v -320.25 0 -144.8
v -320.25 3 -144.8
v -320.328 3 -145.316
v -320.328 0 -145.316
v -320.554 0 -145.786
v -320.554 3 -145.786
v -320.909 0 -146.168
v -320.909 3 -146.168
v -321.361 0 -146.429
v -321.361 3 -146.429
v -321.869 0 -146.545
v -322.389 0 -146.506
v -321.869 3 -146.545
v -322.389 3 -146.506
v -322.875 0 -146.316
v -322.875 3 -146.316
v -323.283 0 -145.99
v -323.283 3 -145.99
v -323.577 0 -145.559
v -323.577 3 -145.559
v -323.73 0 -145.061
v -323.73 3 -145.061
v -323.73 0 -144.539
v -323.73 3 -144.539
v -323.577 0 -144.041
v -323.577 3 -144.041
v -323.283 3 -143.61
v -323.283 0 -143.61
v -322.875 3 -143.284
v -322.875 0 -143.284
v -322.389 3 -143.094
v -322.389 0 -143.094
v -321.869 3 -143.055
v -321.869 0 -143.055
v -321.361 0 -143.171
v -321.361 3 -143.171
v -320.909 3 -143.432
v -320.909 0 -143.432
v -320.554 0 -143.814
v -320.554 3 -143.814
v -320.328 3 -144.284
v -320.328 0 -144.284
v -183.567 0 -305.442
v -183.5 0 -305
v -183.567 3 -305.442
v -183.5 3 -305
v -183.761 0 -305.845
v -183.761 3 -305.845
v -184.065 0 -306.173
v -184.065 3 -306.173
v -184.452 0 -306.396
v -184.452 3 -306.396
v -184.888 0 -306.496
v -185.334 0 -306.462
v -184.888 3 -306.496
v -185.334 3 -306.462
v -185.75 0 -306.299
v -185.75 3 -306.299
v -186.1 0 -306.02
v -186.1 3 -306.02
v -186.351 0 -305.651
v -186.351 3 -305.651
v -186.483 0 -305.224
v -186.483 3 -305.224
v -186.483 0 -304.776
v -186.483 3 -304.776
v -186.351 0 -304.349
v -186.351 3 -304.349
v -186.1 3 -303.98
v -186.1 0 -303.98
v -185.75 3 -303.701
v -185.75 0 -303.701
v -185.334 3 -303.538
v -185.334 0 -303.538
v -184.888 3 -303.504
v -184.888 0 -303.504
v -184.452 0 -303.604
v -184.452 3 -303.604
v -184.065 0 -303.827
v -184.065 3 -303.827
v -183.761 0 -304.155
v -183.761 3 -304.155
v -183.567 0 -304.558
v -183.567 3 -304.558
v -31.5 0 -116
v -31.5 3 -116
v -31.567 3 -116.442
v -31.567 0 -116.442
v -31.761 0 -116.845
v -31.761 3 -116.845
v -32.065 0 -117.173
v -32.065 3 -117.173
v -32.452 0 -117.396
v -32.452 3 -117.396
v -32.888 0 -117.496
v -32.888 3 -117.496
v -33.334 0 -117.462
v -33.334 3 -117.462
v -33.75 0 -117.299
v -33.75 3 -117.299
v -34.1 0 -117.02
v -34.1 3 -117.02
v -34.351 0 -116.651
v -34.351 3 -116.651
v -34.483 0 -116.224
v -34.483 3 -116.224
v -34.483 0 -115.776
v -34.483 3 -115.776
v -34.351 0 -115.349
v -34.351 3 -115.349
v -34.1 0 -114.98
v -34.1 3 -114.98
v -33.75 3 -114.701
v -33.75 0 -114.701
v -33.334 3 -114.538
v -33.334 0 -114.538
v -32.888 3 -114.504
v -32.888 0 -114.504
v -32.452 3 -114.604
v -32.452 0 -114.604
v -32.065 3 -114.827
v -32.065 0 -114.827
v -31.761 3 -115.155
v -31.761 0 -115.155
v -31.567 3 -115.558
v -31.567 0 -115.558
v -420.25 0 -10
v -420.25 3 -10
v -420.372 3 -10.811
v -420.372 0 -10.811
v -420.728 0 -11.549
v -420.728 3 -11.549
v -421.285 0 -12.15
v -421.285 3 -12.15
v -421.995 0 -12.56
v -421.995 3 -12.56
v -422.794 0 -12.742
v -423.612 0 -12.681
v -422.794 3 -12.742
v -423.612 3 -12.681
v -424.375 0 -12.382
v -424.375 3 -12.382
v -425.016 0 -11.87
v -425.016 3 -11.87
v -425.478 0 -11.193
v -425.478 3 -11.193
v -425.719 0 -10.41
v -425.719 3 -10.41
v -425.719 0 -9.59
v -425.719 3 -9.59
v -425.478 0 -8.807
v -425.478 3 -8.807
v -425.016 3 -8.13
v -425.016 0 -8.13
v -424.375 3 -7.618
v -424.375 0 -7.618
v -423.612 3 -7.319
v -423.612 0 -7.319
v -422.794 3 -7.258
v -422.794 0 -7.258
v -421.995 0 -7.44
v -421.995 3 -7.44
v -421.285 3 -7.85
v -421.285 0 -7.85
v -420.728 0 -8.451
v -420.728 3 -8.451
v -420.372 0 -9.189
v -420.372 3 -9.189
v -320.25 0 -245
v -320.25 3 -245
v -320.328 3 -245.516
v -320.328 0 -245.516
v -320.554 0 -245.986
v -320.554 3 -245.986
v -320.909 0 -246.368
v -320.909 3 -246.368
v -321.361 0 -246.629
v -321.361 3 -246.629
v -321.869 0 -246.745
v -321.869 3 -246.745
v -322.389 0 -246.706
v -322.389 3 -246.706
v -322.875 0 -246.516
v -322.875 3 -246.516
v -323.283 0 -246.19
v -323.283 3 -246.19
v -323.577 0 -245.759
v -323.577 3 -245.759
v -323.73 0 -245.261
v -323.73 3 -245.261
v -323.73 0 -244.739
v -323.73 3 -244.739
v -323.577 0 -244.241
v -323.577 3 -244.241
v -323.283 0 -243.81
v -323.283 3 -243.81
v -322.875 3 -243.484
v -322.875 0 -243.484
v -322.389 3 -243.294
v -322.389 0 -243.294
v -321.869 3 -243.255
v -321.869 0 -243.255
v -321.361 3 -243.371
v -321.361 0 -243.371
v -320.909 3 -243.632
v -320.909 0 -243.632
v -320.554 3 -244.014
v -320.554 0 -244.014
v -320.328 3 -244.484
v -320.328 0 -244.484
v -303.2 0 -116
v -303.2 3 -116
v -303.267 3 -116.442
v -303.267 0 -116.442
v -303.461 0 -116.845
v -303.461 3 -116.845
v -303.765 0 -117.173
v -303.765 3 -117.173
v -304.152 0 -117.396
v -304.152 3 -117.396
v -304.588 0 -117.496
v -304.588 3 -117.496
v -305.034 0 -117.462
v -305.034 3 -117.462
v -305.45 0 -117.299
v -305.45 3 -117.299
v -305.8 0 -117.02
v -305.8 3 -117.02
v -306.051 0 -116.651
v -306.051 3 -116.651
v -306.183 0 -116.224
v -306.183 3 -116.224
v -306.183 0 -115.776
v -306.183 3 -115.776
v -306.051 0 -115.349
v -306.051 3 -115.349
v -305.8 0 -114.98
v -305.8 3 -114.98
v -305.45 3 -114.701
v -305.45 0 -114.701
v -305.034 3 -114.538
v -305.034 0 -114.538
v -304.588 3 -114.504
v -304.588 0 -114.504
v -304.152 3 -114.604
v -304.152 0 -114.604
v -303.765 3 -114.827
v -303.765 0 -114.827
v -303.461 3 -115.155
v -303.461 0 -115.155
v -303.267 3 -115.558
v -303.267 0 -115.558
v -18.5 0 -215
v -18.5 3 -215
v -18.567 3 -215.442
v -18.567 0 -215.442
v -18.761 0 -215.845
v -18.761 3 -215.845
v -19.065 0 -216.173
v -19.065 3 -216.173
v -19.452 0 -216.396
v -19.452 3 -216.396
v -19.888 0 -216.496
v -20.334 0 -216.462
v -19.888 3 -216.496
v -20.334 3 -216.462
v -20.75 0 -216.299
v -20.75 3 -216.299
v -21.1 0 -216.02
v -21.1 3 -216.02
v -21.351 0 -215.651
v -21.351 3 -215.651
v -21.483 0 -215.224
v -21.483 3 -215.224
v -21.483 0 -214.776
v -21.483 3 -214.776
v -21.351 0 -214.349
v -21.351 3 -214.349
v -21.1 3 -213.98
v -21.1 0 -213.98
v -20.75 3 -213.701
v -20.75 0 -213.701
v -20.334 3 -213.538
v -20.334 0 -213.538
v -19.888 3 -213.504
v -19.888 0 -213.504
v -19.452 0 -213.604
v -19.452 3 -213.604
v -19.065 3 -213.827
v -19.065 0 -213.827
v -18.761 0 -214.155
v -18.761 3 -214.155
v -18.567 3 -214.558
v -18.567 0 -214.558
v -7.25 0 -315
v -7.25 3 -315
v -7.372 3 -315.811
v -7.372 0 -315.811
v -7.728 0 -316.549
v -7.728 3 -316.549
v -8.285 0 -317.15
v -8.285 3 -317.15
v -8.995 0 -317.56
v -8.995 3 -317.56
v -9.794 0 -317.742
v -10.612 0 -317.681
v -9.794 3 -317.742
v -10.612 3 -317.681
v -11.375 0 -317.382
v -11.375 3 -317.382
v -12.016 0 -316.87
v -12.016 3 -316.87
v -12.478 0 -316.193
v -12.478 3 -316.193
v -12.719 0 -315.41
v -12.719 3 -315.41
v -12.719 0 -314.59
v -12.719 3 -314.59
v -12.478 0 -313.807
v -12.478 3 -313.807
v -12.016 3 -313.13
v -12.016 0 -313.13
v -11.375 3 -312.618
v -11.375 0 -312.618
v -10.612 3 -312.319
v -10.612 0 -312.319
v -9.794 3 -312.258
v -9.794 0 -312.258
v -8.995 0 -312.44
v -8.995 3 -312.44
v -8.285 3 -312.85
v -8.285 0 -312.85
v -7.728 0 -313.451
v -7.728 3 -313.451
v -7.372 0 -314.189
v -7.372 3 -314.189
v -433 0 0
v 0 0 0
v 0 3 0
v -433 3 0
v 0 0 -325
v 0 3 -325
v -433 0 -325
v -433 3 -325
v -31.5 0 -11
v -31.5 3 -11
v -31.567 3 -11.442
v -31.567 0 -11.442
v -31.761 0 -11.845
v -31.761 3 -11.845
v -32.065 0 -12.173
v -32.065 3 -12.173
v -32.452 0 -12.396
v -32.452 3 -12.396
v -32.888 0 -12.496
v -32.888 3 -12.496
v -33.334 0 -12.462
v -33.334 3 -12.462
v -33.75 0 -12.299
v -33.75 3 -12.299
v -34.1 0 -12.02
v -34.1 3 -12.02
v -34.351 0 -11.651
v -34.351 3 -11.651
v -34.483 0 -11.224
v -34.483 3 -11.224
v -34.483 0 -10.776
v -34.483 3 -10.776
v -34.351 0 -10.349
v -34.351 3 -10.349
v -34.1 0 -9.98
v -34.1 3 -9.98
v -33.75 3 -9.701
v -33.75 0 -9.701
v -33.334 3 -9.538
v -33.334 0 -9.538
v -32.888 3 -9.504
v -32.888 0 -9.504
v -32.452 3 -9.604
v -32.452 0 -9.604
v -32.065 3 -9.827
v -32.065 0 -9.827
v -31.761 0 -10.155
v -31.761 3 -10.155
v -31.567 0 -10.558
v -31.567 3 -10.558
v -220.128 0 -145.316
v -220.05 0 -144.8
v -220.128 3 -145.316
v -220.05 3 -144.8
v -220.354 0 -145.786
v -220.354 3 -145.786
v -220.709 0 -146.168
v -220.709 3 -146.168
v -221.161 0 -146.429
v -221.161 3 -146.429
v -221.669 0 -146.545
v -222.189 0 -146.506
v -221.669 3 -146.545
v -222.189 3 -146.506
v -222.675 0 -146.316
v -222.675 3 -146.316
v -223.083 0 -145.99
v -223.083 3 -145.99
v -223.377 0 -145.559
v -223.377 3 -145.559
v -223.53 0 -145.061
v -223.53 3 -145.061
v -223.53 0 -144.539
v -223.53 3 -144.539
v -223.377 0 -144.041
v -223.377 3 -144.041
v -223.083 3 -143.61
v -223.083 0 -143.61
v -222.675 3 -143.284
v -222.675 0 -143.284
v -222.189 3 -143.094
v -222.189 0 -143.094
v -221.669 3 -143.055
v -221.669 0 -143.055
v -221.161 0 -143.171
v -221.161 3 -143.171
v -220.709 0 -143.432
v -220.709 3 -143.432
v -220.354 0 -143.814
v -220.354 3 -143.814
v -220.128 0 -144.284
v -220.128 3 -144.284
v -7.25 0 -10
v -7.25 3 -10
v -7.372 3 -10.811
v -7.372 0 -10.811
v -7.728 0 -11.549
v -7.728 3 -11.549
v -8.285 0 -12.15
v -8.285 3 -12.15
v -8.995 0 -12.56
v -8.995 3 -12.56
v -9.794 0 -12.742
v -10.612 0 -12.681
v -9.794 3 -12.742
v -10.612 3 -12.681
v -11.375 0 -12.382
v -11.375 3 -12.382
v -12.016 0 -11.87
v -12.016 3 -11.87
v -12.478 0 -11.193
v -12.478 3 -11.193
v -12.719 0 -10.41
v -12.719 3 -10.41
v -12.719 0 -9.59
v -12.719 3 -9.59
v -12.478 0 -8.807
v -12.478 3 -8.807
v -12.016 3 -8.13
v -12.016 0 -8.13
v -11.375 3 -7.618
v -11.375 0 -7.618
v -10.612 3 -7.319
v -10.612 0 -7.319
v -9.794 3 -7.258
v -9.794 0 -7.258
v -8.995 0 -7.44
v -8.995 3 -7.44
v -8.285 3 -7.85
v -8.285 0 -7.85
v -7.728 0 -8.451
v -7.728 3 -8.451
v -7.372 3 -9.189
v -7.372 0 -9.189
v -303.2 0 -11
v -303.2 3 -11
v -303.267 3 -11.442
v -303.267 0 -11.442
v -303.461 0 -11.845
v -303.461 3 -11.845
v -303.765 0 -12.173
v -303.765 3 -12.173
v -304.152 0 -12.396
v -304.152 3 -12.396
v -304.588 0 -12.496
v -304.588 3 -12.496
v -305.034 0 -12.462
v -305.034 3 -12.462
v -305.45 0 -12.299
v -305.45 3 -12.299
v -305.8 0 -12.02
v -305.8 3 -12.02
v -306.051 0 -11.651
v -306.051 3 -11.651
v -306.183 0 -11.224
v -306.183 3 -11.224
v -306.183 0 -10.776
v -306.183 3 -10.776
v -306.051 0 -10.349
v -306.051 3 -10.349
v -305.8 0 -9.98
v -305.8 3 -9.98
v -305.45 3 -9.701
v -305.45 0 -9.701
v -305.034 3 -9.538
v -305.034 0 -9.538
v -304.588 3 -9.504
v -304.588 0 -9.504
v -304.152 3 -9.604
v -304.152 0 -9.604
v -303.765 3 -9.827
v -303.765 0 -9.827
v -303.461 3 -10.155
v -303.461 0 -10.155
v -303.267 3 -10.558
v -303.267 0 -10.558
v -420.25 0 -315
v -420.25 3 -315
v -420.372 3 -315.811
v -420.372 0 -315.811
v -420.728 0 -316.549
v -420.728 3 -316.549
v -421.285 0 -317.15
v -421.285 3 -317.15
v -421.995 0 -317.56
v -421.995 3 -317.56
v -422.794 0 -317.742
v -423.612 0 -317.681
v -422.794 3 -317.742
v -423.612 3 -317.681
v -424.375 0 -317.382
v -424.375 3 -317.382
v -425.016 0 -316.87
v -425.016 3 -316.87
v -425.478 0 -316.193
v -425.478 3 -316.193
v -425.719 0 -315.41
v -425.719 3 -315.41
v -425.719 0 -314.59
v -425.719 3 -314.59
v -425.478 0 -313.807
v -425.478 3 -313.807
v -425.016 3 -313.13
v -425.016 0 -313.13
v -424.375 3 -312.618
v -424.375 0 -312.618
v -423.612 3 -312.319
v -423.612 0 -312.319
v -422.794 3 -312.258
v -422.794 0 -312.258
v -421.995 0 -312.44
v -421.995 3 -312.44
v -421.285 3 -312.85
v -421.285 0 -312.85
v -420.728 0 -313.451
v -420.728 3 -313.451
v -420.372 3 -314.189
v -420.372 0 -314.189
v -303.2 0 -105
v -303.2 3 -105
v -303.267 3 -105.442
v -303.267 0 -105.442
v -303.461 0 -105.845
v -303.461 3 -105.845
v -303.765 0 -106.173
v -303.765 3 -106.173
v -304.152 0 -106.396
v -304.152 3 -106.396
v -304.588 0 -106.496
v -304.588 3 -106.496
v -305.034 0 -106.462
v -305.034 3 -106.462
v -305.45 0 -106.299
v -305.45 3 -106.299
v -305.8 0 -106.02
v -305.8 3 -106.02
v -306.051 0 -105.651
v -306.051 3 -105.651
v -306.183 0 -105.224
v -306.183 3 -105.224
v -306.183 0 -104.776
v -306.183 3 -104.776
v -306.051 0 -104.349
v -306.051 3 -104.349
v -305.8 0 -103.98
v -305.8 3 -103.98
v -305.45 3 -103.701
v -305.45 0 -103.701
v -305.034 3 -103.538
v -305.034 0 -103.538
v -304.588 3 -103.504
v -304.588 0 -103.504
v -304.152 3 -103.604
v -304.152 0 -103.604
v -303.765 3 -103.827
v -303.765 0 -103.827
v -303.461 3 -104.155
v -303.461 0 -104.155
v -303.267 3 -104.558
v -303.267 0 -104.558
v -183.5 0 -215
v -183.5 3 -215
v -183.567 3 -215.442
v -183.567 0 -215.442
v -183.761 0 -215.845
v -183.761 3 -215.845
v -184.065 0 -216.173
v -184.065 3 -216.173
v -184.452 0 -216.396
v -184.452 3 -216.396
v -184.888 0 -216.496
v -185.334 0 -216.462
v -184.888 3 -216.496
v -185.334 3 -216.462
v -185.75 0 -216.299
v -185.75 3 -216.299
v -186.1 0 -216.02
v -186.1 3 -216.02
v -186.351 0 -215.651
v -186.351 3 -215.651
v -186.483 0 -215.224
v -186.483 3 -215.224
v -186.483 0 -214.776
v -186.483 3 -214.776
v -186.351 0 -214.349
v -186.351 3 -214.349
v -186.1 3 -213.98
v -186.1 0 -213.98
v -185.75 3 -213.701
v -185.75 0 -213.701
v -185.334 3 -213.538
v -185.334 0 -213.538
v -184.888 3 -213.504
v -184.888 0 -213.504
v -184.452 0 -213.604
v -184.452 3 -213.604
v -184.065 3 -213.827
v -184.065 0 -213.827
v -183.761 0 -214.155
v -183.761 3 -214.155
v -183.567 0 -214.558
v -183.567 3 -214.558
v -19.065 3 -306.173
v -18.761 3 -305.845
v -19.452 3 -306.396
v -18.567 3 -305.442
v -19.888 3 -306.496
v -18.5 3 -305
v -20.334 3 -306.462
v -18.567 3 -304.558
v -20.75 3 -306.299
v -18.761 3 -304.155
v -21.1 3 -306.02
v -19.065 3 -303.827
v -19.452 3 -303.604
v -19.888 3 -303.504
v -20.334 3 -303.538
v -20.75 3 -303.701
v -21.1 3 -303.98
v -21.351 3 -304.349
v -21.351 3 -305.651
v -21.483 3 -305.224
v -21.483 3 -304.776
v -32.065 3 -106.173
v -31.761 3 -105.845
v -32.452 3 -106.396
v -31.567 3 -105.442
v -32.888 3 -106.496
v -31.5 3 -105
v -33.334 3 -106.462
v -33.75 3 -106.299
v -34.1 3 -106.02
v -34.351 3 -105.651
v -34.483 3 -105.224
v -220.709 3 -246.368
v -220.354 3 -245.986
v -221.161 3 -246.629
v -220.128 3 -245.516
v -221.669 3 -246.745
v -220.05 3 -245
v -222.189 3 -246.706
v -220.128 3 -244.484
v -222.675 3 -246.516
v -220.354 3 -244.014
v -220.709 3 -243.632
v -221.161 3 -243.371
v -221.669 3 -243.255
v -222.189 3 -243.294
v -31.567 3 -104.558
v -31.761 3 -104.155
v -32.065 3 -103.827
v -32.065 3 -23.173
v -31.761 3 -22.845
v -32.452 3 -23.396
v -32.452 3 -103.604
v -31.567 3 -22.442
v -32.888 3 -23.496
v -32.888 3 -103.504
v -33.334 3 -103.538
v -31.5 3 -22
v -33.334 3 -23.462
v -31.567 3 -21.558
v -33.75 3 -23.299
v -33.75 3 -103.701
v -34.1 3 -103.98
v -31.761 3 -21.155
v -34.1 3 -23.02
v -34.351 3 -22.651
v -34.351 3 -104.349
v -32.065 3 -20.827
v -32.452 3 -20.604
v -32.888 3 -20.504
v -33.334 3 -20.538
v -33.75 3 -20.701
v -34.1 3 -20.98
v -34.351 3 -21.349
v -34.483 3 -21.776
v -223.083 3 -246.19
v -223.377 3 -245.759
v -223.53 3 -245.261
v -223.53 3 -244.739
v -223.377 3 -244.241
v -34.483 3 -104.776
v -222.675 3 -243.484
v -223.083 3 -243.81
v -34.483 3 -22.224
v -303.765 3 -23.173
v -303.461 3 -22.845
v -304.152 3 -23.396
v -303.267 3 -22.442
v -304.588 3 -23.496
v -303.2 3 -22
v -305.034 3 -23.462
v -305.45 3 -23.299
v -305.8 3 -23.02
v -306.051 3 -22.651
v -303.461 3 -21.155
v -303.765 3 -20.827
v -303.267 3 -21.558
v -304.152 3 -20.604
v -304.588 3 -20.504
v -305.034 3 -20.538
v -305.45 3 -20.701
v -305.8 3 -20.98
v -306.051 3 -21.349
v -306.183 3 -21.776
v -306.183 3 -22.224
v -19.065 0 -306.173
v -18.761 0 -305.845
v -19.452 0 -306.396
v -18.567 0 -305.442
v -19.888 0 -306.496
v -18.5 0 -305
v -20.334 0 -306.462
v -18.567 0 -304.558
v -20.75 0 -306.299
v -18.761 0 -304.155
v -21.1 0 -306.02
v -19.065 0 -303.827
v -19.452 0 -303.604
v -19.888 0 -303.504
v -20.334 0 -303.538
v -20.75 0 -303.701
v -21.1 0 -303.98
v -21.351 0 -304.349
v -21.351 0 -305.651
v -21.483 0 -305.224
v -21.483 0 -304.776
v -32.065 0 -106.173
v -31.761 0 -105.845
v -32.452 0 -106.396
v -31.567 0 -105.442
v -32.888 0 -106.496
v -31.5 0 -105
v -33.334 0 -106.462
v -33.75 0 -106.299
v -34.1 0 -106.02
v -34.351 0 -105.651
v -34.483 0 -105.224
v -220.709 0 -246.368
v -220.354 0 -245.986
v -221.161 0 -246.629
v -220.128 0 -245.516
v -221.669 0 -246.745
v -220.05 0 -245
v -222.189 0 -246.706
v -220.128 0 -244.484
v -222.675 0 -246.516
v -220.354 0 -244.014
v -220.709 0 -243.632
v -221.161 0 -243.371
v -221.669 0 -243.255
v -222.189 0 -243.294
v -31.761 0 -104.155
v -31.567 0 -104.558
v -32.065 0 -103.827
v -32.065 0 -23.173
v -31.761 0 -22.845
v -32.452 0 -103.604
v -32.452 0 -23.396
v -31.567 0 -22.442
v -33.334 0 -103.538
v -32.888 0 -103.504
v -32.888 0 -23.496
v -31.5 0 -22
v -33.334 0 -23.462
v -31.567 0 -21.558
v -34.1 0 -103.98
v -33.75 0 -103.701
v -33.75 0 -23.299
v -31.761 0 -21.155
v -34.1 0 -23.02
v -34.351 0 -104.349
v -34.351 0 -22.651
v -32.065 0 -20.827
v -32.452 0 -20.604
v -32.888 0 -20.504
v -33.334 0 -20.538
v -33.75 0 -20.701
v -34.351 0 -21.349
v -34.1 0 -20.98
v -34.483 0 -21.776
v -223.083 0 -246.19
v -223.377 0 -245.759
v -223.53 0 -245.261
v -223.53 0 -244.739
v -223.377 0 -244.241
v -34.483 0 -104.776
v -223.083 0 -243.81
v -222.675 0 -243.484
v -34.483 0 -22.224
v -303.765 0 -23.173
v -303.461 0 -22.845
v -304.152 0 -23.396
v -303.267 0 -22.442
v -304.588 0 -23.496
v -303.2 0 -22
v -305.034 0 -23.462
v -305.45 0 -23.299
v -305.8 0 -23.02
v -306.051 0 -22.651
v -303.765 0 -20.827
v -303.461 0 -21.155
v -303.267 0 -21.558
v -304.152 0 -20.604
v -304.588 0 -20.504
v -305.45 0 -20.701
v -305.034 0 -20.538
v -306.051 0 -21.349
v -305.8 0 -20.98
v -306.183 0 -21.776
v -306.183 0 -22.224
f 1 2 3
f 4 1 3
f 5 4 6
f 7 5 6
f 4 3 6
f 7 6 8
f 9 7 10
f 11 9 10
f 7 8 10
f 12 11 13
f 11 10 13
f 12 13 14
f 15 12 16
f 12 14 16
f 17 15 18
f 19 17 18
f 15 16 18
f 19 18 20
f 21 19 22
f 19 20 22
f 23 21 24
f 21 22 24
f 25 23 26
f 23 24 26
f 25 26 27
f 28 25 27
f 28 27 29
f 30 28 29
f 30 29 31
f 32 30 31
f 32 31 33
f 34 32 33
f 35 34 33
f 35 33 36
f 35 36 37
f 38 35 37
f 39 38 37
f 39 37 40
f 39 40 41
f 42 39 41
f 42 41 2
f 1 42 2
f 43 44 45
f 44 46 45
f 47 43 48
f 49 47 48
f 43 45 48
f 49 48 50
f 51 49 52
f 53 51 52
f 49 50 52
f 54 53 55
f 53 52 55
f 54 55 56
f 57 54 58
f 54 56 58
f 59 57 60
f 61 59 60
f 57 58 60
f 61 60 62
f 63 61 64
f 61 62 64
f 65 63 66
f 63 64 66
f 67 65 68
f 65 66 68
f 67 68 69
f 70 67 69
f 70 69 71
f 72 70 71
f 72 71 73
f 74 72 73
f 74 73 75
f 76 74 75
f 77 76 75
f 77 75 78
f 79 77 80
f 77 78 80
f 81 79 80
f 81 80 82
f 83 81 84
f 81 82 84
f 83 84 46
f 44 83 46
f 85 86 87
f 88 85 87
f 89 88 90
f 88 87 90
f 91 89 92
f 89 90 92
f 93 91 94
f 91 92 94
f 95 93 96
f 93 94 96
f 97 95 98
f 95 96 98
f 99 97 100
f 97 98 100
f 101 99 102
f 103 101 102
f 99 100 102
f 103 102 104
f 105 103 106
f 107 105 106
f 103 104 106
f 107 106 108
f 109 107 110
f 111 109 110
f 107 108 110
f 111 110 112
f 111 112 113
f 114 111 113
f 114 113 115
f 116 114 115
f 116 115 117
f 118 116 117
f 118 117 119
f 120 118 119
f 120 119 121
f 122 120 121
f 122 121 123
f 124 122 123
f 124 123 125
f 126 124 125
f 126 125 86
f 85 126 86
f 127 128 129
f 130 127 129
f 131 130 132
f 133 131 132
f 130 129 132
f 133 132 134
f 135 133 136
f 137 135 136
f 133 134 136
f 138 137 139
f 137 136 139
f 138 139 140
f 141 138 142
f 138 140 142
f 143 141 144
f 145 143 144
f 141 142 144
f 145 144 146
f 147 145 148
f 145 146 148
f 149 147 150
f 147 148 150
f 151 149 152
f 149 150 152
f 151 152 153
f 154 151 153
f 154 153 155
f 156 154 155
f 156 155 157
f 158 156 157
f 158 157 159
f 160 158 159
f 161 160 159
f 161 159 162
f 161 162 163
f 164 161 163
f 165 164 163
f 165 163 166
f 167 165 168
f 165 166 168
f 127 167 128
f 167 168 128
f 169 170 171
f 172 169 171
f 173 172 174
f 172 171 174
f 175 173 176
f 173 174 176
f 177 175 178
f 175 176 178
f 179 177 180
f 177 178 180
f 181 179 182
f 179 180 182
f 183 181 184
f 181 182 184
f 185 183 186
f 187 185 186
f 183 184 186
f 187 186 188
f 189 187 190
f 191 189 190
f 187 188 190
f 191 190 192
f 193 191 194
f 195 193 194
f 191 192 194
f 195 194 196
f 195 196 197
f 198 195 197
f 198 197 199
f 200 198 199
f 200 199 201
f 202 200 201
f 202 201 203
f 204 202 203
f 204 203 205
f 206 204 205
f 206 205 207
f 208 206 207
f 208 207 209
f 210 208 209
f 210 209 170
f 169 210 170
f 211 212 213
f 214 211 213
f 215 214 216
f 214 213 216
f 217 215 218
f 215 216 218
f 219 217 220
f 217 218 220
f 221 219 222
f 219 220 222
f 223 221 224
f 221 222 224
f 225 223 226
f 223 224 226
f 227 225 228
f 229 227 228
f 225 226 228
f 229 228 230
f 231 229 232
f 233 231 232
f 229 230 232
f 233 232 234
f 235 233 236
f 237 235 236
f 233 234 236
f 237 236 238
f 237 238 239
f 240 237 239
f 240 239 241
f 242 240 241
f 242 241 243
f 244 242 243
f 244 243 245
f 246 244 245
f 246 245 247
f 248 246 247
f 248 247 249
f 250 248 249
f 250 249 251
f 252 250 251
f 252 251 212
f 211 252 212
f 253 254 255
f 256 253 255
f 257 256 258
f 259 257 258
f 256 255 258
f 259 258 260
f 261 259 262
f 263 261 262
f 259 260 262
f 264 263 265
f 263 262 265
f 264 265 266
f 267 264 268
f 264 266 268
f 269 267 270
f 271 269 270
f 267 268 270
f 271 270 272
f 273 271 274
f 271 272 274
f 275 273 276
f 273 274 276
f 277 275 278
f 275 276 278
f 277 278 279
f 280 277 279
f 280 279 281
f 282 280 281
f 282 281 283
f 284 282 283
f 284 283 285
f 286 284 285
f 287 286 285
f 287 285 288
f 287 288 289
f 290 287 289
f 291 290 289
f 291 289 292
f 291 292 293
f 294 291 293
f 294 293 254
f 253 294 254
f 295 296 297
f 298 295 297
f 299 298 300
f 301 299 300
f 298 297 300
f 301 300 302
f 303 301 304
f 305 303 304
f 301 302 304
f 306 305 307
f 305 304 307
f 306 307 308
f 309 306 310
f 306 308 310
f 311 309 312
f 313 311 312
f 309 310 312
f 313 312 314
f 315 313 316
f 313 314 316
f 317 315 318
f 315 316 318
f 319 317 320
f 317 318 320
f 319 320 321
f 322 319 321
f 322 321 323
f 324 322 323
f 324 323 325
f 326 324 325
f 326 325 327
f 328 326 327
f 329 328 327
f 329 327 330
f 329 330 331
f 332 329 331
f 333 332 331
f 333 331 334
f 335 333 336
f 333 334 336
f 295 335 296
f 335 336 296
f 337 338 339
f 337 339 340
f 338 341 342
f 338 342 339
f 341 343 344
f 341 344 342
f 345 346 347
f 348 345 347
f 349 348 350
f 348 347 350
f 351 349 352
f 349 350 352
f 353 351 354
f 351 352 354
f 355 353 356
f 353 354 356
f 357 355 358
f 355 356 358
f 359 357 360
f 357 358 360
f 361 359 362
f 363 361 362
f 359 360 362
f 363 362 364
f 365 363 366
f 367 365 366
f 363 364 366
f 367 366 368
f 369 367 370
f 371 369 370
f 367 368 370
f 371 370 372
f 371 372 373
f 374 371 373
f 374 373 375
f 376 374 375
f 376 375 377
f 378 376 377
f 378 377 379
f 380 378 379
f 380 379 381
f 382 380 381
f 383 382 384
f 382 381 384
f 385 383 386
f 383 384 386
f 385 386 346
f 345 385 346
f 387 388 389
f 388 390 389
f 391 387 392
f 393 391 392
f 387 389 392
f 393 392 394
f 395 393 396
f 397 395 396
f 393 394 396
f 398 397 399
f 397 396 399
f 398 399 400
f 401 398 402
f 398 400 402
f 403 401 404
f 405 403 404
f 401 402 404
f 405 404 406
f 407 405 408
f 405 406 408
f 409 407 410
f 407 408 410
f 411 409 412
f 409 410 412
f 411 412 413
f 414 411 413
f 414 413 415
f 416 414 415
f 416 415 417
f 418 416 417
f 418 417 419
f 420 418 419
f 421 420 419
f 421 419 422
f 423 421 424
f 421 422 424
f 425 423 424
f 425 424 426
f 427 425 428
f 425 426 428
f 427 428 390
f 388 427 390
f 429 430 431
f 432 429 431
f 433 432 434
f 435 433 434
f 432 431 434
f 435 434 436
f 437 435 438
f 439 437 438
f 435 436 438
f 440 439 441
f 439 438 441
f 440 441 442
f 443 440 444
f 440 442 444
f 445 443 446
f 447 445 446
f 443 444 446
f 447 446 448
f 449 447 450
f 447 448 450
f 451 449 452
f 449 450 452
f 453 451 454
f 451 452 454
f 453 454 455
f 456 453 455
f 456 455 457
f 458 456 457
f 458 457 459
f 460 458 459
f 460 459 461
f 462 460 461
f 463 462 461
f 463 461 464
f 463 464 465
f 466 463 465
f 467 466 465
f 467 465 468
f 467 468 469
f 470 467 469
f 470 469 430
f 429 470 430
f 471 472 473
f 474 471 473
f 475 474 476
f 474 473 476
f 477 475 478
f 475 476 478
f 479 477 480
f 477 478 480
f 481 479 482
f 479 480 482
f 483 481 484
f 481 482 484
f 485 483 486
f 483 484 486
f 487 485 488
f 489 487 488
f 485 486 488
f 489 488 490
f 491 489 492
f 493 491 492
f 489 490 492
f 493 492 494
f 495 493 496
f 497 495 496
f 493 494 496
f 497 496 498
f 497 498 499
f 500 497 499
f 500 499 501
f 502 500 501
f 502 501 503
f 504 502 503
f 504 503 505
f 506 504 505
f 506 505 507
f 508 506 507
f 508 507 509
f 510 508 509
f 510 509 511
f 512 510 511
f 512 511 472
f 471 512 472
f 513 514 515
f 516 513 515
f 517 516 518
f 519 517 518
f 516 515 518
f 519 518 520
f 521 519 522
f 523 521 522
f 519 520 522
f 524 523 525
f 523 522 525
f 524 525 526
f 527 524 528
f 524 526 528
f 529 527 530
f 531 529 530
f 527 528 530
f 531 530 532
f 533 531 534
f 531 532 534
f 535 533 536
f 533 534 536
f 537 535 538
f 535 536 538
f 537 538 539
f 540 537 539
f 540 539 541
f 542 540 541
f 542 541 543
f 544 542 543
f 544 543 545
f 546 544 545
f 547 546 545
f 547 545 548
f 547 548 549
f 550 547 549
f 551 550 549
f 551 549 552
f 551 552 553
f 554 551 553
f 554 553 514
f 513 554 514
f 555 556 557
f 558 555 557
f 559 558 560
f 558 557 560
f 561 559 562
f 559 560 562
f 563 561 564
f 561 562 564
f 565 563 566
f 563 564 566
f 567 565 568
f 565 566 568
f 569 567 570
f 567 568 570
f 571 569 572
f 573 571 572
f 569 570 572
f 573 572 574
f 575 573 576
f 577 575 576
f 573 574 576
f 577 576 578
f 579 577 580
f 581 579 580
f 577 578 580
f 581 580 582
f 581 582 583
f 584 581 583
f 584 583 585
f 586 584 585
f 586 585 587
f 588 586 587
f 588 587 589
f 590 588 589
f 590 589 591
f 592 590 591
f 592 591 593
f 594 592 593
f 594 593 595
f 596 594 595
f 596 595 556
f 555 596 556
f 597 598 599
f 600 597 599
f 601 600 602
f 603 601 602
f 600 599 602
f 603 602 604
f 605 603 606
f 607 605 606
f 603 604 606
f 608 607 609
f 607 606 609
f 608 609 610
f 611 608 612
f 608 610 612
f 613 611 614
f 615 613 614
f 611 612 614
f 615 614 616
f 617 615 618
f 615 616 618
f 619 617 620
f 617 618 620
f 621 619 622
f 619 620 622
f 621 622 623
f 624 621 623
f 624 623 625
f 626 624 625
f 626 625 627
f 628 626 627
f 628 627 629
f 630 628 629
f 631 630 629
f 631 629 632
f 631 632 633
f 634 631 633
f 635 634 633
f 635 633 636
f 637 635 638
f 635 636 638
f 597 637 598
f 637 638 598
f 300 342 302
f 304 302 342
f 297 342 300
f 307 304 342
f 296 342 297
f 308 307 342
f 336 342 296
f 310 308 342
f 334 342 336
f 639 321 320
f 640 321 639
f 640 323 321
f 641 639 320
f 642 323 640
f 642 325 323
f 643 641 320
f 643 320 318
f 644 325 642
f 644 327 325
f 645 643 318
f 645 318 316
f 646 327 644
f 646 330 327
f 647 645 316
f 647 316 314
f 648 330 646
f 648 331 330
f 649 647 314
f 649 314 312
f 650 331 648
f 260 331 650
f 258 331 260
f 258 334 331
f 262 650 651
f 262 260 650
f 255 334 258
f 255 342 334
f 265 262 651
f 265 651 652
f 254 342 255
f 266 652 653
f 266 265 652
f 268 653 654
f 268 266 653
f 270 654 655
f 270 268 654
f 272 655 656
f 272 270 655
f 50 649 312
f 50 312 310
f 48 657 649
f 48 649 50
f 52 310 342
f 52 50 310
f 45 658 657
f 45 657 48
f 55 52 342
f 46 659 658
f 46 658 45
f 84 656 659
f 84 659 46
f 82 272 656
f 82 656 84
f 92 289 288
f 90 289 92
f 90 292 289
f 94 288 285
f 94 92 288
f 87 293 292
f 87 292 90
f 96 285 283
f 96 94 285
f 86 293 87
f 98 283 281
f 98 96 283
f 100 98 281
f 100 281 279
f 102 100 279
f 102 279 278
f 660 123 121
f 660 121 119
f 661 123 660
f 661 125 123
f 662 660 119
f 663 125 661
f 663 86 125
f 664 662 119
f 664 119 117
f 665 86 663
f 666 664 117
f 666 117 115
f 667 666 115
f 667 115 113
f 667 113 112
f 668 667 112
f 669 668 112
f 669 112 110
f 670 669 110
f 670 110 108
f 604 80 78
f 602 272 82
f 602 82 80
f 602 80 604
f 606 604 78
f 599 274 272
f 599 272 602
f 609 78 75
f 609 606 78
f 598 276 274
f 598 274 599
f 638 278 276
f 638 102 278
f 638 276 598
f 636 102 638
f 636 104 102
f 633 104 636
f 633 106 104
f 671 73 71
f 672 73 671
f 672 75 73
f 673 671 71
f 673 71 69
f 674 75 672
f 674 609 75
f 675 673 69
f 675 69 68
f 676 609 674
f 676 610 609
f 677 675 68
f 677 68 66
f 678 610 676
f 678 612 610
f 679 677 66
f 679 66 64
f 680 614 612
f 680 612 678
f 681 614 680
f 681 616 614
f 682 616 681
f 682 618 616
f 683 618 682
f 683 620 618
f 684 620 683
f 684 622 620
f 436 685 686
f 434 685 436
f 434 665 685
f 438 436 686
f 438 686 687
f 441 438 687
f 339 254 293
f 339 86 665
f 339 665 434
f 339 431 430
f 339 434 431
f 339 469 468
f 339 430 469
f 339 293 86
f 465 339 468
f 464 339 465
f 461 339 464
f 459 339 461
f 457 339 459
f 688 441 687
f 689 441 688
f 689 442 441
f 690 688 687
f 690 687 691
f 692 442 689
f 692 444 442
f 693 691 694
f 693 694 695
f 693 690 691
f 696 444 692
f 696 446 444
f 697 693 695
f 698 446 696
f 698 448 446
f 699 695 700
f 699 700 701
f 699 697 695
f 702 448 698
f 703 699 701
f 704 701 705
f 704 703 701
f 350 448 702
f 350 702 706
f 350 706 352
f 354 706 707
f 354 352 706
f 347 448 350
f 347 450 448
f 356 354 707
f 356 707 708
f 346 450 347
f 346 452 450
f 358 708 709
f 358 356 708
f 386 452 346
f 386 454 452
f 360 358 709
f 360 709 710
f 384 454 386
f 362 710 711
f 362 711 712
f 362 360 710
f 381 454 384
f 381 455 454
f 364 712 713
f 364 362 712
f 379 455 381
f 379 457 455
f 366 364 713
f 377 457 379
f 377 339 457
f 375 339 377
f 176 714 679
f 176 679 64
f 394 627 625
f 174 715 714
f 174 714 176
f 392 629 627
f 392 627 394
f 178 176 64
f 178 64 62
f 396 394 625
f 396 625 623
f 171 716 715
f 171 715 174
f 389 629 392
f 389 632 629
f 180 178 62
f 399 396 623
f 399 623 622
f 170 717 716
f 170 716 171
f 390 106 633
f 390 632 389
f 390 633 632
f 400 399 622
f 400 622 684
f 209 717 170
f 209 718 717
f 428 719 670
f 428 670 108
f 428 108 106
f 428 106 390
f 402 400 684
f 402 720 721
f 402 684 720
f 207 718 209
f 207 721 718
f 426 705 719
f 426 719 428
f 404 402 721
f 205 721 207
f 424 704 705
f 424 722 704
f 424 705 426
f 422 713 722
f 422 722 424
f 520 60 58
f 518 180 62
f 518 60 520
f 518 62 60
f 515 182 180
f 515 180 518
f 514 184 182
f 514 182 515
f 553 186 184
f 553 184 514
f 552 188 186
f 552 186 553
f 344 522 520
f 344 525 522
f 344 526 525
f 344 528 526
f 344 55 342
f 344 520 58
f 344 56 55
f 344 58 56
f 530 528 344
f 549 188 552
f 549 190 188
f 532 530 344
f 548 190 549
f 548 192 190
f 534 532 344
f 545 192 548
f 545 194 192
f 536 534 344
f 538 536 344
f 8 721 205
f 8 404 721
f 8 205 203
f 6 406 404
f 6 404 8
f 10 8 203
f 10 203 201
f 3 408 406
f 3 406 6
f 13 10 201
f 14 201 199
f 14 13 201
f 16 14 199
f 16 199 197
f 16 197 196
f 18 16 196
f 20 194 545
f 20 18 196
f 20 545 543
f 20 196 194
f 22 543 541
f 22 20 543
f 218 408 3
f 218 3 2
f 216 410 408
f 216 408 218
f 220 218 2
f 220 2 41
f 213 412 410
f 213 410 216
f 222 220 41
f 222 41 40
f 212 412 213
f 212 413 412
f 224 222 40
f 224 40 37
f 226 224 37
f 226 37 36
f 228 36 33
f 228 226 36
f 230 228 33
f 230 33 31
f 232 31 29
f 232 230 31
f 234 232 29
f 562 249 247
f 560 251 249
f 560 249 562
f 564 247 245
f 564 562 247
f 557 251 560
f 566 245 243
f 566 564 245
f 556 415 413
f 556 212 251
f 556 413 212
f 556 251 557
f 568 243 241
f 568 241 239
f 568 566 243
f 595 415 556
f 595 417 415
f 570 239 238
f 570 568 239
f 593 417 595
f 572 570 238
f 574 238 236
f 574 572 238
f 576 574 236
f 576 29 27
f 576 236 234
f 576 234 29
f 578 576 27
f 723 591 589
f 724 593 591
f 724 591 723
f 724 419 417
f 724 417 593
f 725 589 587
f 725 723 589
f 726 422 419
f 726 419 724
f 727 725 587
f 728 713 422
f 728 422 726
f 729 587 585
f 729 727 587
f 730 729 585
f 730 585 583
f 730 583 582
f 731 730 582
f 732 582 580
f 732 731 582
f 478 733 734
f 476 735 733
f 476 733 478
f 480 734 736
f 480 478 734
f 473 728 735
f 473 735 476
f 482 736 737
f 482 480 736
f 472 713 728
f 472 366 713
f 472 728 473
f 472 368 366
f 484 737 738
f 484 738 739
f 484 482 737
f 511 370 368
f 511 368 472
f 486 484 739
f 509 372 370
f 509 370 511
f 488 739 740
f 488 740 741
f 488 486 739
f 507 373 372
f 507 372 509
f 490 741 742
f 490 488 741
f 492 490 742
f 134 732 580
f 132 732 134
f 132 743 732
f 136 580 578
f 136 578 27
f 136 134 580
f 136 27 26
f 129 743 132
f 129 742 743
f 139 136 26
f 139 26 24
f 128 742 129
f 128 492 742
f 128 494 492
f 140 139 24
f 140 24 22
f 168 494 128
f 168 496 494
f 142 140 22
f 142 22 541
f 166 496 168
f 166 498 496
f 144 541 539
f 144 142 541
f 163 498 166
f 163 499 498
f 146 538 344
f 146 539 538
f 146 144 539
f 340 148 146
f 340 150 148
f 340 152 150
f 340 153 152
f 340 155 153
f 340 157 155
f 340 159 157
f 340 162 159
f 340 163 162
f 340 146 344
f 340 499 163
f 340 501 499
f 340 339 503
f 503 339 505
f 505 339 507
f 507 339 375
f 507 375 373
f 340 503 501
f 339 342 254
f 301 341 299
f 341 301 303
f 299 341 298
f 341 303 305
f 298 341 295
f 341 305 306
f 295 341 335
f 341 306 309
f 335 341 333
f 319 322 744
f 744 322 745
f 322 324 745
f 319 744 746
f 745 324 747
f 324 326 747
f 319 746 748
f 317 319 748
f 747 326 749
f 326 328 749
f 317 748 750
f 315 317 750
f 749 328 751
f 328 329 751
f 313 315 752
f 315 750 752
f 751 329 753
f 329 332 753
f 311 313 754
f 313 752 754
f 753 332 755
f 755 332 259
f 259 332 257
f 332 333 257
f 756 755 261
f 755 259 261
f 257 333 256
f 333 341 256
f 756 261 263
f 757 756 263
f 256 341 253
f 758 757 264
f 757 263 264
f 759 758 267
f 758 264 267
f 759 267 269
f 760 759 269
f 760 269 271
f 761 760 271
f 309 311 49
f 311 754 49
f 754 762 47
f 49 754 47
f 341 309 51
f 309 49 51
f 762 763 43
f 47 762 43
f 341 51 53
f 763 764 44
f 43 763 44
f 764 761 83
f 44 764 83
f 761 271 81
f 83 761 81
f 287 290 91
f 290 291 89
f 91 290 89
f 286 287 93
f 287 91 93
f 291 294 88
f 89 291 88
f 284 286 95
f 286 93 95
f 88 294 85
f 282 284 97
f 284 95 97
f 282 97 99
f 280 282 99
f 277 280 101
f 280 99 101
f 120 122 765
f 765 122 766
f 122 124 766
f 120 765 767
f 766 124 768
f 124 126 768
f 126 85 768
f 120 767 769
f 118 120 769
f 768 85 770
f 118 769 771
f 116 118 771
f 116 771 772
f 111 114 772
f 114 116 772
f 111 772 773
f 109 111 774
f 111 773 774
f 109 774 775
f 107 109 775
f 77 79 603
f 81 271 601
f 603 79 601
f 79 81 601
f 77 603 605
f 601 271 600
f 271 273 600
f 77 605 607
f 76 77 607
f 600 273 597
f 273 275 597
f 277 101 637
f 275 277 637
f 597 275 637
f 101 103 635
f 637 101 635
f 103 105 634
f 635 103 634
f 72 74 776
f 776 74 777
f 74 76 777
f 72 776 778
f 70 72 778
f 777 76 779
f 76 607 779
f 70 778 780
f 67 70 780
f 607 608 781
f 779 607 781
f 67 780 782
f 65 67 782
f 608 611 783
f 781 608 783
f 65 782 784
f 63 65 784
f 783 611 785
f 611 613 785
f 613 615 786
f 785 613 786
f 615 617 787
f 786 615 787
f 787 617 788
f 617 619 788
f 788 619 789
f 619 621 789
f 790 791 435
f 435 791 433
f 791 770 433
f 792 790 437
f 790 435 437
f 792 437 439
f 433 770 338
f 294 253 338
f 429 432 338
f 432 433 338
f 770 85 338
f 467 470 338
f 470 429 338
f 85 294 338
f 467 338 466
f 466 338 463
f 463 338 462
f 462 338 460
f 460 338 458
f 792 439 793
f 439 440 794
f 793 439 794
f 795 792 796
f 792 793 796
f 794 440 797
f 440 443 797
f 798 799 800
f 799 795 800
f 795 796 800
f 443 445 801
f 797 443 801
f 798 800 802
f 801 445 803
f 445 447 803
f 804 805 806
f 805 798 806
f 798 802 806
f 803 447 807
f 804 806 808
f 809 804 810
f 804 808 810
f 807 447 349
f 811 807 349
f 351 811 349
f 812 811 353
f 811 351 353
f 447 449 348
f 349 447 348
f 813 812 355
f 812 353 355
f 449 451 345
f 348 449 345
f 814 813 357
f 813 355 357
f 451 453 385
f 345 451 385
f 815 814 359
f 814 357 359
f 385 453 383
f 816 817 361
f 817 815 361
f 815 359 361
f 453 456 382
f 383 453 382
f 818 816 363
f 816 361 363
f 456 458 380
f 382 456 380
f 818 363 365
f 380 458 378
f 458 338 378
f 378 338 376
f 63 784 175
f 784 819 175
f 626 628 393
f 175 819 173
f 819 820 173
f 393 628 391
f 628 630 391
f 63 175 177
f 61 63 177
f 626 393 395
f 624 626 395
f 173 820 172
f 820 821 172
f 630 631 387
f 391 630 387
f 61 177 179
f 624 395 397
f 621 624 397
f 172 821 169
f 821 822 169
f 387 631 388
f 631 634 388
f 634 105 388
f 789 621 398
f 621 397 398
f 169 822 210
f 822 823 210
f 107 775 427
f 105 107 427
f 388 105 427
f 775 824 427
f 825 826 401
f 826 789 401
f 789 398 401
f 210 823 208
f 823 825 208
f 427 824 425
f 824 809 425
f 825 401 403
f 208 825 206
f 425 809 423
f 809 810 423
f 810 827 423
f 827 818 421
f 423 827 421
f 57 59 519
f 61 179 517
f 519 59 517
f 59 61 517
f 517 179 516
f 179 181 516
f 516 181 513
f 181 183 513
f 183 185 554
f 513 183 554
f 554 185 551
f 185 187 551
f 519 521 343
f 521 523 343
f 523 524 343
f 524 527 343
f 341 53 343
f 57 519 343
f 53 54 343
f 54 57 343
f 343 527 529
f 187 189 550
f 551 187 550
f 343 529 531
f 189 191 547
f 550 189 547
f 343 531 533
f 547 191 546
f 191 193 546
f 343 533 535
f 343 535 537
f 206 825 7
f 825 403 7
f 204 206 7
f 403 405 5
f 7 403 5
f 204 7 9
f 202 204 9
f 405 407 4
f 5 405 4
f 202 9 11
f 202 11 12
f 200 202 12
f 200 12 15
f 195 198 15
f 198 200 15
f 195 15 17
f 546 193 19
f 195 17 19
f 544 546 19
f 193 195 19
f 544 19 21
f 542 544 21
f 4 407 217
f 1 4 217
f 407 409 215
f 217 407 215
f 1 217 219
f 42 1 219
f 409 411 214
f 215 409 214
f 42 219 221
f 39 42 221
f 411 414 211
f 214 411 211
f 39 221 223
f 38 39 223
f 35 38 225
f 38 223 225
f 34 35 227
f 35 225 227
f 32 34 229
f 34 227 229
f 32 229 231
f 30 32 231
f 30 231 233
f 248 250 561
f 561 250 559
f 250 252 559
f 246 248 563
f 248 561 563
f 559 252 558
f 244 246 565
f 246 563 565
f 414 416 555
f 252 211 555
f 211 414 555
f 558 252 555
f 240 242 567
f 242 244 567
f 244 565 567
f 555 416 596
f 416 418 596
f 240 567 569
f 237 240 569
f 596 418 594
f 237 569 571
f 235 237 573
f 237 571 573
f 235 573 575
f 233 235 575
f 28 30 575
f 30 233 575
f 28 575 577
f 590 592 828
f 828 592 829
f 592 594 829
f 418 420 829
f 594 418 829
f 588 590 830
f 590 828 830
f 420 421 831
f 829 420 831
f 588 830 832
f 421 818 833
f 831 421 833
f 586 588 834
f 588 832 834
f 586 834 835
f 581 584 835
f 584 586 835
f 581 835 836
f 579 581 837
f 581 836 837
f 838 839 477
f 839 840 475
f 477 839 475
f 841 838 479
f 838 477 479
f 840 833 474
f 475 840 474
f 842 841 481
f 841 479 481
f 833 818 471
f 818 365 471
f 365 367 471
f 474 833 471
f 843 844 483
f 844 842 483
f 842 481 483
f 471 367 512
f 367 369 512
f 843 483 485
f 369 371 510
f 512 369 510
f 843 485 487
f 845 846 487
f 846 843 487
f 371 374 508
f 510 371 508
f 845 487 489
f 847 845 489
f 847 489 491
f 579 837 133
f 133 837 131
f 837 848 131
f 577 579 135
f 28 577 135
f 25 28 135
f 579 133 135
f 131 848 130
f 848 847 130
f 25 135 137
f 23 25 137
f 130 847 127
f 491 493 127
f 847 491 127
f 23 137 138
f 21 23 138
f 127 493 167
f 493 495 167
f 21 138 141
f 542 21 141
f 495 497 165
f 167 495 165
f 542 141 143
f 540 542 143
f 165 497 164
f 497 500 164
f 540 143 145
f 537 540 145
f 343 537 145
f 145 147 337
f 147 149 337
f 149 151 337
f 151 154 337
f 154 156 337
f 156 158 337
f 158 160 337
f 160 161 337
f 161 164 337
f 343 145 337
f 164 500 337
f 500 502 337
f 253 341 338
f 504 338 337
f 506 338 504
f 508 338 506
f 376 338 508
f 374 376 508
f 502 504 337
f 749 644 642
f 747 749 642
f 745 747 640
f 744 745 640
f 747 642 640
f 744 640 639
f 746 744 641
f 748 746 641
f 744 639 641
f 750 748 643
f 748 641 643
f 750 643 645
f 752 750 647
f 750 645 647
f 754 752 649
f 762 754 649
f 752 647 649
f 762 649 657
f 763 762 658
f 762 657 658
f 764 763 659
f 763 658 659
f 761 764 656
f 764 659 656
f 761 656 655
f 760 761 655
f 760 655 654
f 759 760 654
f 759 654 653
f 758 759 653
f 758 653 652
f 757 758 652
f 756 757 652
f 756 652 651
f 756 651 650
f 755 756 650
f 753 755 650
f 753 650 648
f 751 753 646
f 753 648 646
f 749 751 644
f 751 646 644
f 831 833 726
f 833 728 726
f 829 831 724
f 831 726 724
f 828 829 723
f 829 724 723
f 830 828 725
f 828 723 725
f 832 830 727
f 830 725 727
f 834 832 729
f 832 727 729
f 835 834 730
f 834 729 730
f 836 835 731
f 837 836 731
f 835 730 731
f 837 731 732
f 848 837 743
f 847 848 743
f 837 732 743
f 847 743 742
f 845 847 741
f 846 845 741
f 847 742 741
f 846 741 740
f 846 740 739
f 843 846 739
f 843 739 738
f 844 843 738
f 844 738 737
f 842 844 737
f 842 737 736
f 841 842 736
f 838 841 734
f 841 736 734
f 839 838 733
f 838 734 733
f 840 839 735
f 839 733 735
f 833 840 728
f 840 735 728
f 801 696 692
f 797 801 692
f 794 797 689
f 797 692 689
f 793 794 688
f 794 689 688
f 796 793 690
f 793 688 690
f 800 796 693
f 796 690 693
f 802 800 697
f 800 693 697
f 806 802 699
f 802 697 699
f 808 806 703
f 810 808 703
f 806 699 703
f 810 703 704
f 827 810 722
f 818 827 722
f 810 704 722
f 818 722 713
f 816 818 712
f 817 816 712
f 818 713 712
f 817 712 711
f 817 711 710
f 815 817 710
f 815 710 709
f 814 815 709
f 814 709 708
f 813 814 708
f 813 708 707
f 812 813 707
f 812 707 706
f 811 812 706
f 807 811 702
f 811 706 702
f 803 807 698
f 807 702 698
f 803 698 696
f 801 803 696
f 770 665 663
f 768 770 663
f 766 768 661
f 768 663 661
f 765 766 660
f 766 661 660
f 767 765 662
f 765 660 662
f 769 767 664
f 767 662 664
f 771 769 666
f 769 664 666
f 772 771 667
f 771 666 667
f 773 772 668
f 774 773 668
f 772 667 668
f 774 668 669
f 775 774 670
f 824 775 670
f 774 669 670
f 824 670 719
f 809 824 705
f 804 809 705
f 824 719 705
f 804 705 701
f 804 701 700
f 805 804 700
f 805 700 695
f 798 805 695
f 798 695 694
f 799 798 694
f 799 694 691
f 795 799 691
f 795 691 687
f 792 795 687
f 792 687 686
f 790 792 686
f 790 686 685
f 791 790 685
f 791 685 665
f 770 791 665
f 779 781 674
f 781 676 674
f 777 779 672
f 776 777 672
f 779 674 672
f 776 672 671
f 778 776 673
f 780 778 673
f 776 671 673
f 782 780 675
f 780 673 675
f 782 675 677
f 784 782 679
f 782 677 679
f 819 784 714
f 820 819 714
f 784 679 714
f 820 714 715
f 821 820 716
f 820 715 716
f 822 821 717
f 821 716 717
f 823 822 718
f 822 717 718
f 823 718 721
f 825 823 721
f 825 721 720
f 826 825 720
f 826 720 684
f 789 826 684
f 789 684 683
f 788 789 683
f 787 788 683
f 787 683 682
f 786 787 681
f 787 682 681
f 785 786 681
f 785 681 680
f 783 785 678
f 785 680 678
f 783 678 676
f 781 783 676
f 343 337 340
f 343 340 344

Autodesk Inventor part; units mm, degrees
ref_plane "YZ Plane" through (0, 0, 0) normal (1, 0, 0) x (0, 1, 0)
ref_plane "XZ Plane" through (0, 0, 0) normal (0, 1, 0) x (-1, 0, 0)
ref_plane "XY Plane" through (0, 0, 0) normal (0, 0, 1) x (1, 0, 0)
sketch "Sketch1" plane through (0, 0, 0) normal (0, 1, 0) x (-1, 0, 0)
  line L0 (0, 0) -> (433, 0)
  line L1 (433, 0) -> (433, -325)
  line L2 (433, -325) -> (0, -325)
  line L3 (0, -325) -> (0, 0)
  dimension "d0" = 433
  dimension "d1" = 325
extrude "Extrusion1" add sketch "Sketch1" along normal blind 3
sketch "Sketch2" plane through (0, 3, 0) normal (0, 1, 0) x (1, 0, 0)
  circle A0 centre (-10, 10) radius 2.75
  line L0 (0, 0) -> (0, 325) projected
  line L1 (-433, 0) -> (0, 0) projected
  circle A1 centre (-10, 315) radius 2.75
  circle A2 centre (-423, 10) radius 2.75
  circle A3 centre (-423, 315) radius 2.75
  dimension "d4" = 5.5
  dimension "d5" = 10
  dimension "d6" = 10
  dimension "d9" = 305
  dimension "d12" = 413
extrude "Extrusion2" cut sketch "Sketch2" against normal blind 3
sketch "Sketch5" plane through (0, 3, 0) normal (0, 1, 0) x (1, 0, 0)
  line L0 (0, 0) -> (0, 325) projected
  line L1 (0, 325) -> (0, 305)
  line L2 (0, 305) -> (-20, 305)
  circle A0 centre (-20, 305) radius 1.5
  line L3 (0, 325) -> (-433, 325) projected
  line L4 (0, 325) -> (-15, 325)
  circle A1 centre (-185, 305) radius 1.5
  circle A2 centre (-20, 215) radius 1.5
  circle A3 centre (-185, 215) radius 1.5
  dimension "d37" = 20
  dimension "d38" = 20
  dimension "d39" = 3
  dimension "d40" = 15
  dimension "d43" = 165
  dimension "d46" = 90
extrude "Extrusion5" cut sketch "Sketch5" against normal blind 3
sketch "Sketch6" plane through (0, 3, 0) normal (0, 1, 0) x (1, 0, 0)
  line L0 (-433, 0) -> (0, 0) projected
  line L1 (0, 0) -> (-33, 0)
  line L2 (-33, 0) -> (-33, 11)
  circle A0 centre (-33, 11) radius 1.5
  line L3 (-33, 11) -> (-33, 22)
  circle A1 centre (-33, 22) radius 1.5
  dimension "d51" = 33
  dimension "d52" = 11
  dimension "d53" = 3
  dimension "d54" = 11
  dimension "d55" = 180
  dimension "d56" = 3
extrude "Extrusion6" cut sketch "Sketch6" against normal blind 3
pattern_linear "Rectangular Pattern1" count 2 spacing 94 along (0, 0, -1) count 2 spacing 271.7 along (-1, 0, 0) of "Extrusion6"
sketch "Sketch7" plane through (0, 3, 0) normal (0, 1, 0) x (1, 0, 0)
  line L0 (-433, 325) -> (-433, 0) projected
  line L1 (-433, 325) -> (-322, 325)
  line L2 (0, 325) -> (-433, 325) projected
  line L3 (-322, 325) -> (-322, 245)
  circle A0 centre (-322, 245) radius 1.75
  circle A1 centre (-221.8, 245) radius 1.75
  circle A2 centre (-322, 144.8) radius 1.75
  circle A3 centre (-221.8, 144.8) radius 1.75
  point P0 (0, 0)
  dimension "d65" = 111
  dimension "d66" = 80
  dimension "d67" = 3.5
  dimension "d70" = 100.2
  dimension "d73" = 100.2
extrude "Extrusion7" cut sketch "Sketch7" against normal blind 3
properties part number "Acrylic_Mount" material "PET Plastic"
